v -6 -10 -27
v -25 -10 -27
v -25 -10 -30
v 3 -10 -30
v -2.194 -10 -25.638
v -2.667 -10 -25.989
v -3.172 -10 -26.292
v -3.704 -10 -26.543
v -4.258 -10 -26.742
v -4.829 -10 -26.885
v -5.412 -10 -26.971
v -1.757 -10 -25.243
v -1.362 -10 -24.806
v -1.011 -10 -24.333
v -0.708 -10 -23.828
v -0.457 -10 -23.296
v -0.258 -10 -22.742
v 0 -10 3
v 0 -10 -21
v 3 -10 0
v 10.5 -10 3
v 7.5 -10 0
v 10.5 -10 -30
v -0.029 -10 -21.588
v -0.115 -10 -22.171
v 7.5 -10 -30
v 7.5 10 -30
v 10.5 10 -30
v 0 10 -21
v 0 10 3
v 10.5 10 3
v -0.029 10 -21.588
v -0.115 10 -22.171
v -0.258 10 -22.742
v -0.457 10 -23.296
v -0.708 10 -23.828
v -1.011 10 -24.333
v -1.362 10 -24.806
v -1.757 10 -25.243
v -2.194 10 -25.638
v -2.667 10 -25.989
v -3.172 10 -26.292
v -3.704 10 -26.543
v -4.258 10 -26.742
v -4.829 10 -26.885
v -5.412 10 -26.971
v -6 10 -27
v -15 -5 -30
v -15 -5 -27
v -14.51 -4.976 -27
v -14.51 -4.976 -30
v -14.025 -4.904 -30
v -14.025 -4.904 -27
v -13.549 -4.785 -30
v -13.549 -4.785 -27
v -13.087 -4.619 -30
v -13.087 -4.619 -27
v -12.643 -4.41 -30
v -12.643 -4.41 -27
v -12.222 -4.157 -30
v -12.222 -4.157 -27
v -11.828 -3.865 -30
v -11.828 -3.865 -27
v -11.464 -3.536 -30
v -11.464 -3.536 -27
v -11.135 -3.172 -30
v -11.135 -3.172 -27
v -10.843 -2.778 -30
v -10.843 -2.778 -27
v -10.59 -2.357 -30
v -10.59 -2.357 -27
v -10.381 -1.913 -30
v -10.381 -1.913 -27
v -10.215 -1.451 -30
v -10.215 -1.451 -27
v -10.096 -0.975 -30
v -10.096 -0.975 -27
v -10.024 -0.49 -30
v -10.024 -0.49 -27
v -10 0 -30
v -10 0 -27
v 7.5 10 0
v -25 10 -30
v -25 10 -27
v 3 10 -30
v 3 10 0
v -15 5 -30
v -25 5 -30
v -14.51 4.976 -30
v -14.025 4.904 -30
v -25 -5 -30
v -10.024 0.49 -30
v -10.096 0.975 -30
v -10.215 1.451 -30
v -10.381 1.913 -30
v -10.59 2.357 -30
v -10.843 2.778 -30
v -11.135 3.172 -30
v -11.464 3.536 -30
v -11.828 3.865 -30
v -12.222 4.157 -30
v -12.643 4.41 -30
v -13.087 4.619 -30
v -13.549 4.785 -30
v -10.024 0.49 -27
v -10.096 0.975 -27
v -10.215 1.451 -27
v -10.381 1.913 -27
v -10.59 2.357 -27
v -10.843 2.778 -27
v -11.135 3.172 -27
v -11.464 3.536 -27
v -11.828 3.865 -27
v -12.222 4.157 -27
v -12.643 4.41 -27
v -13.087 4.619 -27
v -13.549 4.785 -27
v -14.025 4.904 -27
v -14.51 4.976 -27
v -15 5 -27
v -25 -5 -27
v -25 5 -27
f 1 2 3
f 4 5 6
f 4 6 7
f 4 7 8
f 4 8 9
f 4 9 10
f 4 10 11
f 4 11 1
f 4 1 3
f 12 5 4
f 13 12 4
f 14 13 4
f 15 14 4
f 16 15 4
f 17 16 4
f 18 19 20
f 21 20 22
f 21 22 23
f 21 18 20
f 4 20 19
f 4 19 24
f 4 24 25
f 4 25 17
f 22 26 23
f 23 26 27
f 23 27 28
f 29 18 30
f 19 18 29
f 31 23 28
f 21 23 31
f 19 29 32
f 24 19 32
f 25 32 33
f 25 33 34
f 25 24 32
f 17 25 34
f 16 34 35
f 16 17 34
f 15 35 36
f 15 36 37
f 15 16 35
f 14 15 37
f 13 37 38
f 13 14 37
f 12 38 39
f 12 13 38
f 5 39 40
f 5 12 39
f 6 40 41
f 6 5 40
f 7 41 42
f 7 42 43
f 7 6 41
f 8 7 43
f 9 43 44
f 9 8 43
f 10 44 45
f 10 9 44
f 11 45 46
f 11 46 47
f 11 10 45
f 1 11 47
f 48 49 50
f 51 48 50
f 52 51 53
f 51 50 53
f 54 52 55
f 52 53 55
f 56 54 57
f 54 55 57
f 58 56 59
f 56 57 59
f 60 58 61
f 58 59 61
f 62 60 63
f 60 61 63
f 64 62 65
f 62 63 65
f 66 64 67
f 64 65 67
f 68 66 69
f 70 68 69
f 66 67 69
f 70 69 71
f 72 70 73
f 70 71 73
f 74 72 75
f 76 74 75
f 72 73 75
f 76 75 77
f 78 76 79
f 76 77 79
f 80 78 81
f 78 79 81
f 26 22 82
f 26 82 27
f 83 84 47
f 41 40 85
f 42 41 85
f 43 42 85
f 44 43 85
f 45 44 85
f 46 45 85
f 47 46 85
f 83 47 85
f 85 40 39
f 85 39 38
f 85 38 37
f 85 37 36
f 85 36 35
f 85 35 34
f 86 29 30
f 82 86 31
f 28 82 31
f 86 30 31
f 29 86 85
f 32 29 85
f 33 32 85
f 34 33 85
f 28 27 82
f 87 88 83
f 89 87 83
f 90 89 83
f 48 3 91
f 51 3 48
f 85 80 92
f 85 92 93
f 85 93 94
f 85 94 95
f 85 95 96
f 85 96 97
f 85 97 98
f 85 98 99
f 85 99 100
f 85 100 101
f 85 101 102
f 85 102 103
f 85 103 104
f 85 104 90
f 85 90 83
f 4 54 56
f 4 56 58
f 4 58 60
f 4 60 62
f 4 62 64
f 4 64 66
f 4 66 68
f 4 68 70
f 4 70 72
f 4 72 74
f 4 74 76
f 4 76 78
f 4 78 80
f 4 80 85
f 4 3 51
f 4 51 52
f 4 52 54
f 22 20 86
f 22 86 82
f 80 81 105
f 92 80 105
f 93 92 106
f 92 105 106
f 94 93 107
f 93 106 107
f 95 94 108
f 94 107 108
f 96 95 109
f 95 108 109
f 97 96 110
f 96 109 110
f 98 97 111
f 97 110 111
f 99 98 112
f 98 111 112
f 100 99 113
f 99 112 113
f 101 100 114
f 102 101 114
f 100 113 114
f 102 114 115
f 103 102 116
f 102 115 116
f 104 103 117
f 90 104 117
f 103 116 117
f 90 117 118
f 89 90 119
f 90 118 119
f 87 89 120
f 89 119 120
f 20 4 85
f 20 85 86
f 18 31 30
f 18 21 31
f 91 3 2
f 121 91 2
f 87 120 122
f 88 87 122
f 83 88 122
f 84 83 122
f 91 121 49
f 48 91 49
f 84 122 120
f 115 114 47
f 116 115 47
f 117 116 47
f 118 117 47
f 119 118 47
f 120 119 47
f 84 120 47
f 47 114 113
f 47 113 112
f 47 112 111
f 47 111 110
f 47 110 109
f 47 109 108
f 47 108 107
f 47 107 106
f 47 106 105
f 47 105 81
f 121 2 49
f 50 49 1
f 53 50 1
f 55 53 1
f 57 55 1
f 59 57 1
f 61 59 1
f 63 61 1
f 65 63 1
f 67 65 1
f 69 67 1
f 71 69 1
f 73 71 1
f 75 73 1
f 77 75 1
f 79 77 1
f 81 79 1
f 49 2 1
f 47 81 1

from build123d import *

# Parameters (mm, degrees)
F0_W          = 3
F0_H          = 3
F0_W_2        = 4.5
F0_W_3        = 25
F1_DEPTH      = 10
F1_DEPTH_BACK = 10
F4_DEPTH      = 10
F4_DEPTH_BACK = 10
F5_R          = 6


with BuildPart() as f1:
    # F0 (on Front) → F1 (new body, two sides)
    with BuildSketch(Plane.XZ) as f1_sk:
        with Locations((1.5, 1.5)):
            Rectangle(F0_W, F0_H)
        Polygon((3, 0), (0, 0), (0, -27), (0, -30), (3, -30), align=None)
        with Locations((5.25, 1.5)):
            Rectangle(F0_W_2, F0_H)
        with Locations((-12.5, -28.5)):
            Rectangle(F0_W_3, F0_H)
        Polygon((7.5, 3), (7.5, 0), (7.5, -30), (10.5, -30), (10.5, 3), align=None)
    extrude(amount=F1_DEPTH)
    extrude(f1_sk.sketch, amount=-F1_DEPTH_BACK)

    # F3 (on offset) → F4 (cut, two sides)
    with BuildSketch(Plane.XY.offset(-20)) as f4_sk:
        with BuildLine():
            ThreePointArc((-15, -5), (-11.464466, -3.535534), (-10, 0))
            Line((-10, 0), (-25, 0))
            Line((-25, 0), (-25, -5))
            Line((-25, -5), (-15, -5))
        make_face()
        with BuildLine():
            Line((-25, 0), (-10, 0))
            ThreePointArc((-10, 0), (-11.464466, 3.535534), (-15, 5))
            Line((-15, 5), (-25, 5))
            Line((-25, 5), (-25, 0))
        make_face()
    extrude(amount=F4_DEPTH, mode=Mode.SUBTRACT)
    extrude(f4_sk.sketch, amount=-F4_DEPTH_BACK, mode=Mode.SUBTRACT)

    # F5
    f5_edges = [f1.edges().sort_by_distance(p)[0] for p in [
        (0, 0, -27),
    ]]
    fillet(f5_edges, radius=F5_R)


solid = f1.part
